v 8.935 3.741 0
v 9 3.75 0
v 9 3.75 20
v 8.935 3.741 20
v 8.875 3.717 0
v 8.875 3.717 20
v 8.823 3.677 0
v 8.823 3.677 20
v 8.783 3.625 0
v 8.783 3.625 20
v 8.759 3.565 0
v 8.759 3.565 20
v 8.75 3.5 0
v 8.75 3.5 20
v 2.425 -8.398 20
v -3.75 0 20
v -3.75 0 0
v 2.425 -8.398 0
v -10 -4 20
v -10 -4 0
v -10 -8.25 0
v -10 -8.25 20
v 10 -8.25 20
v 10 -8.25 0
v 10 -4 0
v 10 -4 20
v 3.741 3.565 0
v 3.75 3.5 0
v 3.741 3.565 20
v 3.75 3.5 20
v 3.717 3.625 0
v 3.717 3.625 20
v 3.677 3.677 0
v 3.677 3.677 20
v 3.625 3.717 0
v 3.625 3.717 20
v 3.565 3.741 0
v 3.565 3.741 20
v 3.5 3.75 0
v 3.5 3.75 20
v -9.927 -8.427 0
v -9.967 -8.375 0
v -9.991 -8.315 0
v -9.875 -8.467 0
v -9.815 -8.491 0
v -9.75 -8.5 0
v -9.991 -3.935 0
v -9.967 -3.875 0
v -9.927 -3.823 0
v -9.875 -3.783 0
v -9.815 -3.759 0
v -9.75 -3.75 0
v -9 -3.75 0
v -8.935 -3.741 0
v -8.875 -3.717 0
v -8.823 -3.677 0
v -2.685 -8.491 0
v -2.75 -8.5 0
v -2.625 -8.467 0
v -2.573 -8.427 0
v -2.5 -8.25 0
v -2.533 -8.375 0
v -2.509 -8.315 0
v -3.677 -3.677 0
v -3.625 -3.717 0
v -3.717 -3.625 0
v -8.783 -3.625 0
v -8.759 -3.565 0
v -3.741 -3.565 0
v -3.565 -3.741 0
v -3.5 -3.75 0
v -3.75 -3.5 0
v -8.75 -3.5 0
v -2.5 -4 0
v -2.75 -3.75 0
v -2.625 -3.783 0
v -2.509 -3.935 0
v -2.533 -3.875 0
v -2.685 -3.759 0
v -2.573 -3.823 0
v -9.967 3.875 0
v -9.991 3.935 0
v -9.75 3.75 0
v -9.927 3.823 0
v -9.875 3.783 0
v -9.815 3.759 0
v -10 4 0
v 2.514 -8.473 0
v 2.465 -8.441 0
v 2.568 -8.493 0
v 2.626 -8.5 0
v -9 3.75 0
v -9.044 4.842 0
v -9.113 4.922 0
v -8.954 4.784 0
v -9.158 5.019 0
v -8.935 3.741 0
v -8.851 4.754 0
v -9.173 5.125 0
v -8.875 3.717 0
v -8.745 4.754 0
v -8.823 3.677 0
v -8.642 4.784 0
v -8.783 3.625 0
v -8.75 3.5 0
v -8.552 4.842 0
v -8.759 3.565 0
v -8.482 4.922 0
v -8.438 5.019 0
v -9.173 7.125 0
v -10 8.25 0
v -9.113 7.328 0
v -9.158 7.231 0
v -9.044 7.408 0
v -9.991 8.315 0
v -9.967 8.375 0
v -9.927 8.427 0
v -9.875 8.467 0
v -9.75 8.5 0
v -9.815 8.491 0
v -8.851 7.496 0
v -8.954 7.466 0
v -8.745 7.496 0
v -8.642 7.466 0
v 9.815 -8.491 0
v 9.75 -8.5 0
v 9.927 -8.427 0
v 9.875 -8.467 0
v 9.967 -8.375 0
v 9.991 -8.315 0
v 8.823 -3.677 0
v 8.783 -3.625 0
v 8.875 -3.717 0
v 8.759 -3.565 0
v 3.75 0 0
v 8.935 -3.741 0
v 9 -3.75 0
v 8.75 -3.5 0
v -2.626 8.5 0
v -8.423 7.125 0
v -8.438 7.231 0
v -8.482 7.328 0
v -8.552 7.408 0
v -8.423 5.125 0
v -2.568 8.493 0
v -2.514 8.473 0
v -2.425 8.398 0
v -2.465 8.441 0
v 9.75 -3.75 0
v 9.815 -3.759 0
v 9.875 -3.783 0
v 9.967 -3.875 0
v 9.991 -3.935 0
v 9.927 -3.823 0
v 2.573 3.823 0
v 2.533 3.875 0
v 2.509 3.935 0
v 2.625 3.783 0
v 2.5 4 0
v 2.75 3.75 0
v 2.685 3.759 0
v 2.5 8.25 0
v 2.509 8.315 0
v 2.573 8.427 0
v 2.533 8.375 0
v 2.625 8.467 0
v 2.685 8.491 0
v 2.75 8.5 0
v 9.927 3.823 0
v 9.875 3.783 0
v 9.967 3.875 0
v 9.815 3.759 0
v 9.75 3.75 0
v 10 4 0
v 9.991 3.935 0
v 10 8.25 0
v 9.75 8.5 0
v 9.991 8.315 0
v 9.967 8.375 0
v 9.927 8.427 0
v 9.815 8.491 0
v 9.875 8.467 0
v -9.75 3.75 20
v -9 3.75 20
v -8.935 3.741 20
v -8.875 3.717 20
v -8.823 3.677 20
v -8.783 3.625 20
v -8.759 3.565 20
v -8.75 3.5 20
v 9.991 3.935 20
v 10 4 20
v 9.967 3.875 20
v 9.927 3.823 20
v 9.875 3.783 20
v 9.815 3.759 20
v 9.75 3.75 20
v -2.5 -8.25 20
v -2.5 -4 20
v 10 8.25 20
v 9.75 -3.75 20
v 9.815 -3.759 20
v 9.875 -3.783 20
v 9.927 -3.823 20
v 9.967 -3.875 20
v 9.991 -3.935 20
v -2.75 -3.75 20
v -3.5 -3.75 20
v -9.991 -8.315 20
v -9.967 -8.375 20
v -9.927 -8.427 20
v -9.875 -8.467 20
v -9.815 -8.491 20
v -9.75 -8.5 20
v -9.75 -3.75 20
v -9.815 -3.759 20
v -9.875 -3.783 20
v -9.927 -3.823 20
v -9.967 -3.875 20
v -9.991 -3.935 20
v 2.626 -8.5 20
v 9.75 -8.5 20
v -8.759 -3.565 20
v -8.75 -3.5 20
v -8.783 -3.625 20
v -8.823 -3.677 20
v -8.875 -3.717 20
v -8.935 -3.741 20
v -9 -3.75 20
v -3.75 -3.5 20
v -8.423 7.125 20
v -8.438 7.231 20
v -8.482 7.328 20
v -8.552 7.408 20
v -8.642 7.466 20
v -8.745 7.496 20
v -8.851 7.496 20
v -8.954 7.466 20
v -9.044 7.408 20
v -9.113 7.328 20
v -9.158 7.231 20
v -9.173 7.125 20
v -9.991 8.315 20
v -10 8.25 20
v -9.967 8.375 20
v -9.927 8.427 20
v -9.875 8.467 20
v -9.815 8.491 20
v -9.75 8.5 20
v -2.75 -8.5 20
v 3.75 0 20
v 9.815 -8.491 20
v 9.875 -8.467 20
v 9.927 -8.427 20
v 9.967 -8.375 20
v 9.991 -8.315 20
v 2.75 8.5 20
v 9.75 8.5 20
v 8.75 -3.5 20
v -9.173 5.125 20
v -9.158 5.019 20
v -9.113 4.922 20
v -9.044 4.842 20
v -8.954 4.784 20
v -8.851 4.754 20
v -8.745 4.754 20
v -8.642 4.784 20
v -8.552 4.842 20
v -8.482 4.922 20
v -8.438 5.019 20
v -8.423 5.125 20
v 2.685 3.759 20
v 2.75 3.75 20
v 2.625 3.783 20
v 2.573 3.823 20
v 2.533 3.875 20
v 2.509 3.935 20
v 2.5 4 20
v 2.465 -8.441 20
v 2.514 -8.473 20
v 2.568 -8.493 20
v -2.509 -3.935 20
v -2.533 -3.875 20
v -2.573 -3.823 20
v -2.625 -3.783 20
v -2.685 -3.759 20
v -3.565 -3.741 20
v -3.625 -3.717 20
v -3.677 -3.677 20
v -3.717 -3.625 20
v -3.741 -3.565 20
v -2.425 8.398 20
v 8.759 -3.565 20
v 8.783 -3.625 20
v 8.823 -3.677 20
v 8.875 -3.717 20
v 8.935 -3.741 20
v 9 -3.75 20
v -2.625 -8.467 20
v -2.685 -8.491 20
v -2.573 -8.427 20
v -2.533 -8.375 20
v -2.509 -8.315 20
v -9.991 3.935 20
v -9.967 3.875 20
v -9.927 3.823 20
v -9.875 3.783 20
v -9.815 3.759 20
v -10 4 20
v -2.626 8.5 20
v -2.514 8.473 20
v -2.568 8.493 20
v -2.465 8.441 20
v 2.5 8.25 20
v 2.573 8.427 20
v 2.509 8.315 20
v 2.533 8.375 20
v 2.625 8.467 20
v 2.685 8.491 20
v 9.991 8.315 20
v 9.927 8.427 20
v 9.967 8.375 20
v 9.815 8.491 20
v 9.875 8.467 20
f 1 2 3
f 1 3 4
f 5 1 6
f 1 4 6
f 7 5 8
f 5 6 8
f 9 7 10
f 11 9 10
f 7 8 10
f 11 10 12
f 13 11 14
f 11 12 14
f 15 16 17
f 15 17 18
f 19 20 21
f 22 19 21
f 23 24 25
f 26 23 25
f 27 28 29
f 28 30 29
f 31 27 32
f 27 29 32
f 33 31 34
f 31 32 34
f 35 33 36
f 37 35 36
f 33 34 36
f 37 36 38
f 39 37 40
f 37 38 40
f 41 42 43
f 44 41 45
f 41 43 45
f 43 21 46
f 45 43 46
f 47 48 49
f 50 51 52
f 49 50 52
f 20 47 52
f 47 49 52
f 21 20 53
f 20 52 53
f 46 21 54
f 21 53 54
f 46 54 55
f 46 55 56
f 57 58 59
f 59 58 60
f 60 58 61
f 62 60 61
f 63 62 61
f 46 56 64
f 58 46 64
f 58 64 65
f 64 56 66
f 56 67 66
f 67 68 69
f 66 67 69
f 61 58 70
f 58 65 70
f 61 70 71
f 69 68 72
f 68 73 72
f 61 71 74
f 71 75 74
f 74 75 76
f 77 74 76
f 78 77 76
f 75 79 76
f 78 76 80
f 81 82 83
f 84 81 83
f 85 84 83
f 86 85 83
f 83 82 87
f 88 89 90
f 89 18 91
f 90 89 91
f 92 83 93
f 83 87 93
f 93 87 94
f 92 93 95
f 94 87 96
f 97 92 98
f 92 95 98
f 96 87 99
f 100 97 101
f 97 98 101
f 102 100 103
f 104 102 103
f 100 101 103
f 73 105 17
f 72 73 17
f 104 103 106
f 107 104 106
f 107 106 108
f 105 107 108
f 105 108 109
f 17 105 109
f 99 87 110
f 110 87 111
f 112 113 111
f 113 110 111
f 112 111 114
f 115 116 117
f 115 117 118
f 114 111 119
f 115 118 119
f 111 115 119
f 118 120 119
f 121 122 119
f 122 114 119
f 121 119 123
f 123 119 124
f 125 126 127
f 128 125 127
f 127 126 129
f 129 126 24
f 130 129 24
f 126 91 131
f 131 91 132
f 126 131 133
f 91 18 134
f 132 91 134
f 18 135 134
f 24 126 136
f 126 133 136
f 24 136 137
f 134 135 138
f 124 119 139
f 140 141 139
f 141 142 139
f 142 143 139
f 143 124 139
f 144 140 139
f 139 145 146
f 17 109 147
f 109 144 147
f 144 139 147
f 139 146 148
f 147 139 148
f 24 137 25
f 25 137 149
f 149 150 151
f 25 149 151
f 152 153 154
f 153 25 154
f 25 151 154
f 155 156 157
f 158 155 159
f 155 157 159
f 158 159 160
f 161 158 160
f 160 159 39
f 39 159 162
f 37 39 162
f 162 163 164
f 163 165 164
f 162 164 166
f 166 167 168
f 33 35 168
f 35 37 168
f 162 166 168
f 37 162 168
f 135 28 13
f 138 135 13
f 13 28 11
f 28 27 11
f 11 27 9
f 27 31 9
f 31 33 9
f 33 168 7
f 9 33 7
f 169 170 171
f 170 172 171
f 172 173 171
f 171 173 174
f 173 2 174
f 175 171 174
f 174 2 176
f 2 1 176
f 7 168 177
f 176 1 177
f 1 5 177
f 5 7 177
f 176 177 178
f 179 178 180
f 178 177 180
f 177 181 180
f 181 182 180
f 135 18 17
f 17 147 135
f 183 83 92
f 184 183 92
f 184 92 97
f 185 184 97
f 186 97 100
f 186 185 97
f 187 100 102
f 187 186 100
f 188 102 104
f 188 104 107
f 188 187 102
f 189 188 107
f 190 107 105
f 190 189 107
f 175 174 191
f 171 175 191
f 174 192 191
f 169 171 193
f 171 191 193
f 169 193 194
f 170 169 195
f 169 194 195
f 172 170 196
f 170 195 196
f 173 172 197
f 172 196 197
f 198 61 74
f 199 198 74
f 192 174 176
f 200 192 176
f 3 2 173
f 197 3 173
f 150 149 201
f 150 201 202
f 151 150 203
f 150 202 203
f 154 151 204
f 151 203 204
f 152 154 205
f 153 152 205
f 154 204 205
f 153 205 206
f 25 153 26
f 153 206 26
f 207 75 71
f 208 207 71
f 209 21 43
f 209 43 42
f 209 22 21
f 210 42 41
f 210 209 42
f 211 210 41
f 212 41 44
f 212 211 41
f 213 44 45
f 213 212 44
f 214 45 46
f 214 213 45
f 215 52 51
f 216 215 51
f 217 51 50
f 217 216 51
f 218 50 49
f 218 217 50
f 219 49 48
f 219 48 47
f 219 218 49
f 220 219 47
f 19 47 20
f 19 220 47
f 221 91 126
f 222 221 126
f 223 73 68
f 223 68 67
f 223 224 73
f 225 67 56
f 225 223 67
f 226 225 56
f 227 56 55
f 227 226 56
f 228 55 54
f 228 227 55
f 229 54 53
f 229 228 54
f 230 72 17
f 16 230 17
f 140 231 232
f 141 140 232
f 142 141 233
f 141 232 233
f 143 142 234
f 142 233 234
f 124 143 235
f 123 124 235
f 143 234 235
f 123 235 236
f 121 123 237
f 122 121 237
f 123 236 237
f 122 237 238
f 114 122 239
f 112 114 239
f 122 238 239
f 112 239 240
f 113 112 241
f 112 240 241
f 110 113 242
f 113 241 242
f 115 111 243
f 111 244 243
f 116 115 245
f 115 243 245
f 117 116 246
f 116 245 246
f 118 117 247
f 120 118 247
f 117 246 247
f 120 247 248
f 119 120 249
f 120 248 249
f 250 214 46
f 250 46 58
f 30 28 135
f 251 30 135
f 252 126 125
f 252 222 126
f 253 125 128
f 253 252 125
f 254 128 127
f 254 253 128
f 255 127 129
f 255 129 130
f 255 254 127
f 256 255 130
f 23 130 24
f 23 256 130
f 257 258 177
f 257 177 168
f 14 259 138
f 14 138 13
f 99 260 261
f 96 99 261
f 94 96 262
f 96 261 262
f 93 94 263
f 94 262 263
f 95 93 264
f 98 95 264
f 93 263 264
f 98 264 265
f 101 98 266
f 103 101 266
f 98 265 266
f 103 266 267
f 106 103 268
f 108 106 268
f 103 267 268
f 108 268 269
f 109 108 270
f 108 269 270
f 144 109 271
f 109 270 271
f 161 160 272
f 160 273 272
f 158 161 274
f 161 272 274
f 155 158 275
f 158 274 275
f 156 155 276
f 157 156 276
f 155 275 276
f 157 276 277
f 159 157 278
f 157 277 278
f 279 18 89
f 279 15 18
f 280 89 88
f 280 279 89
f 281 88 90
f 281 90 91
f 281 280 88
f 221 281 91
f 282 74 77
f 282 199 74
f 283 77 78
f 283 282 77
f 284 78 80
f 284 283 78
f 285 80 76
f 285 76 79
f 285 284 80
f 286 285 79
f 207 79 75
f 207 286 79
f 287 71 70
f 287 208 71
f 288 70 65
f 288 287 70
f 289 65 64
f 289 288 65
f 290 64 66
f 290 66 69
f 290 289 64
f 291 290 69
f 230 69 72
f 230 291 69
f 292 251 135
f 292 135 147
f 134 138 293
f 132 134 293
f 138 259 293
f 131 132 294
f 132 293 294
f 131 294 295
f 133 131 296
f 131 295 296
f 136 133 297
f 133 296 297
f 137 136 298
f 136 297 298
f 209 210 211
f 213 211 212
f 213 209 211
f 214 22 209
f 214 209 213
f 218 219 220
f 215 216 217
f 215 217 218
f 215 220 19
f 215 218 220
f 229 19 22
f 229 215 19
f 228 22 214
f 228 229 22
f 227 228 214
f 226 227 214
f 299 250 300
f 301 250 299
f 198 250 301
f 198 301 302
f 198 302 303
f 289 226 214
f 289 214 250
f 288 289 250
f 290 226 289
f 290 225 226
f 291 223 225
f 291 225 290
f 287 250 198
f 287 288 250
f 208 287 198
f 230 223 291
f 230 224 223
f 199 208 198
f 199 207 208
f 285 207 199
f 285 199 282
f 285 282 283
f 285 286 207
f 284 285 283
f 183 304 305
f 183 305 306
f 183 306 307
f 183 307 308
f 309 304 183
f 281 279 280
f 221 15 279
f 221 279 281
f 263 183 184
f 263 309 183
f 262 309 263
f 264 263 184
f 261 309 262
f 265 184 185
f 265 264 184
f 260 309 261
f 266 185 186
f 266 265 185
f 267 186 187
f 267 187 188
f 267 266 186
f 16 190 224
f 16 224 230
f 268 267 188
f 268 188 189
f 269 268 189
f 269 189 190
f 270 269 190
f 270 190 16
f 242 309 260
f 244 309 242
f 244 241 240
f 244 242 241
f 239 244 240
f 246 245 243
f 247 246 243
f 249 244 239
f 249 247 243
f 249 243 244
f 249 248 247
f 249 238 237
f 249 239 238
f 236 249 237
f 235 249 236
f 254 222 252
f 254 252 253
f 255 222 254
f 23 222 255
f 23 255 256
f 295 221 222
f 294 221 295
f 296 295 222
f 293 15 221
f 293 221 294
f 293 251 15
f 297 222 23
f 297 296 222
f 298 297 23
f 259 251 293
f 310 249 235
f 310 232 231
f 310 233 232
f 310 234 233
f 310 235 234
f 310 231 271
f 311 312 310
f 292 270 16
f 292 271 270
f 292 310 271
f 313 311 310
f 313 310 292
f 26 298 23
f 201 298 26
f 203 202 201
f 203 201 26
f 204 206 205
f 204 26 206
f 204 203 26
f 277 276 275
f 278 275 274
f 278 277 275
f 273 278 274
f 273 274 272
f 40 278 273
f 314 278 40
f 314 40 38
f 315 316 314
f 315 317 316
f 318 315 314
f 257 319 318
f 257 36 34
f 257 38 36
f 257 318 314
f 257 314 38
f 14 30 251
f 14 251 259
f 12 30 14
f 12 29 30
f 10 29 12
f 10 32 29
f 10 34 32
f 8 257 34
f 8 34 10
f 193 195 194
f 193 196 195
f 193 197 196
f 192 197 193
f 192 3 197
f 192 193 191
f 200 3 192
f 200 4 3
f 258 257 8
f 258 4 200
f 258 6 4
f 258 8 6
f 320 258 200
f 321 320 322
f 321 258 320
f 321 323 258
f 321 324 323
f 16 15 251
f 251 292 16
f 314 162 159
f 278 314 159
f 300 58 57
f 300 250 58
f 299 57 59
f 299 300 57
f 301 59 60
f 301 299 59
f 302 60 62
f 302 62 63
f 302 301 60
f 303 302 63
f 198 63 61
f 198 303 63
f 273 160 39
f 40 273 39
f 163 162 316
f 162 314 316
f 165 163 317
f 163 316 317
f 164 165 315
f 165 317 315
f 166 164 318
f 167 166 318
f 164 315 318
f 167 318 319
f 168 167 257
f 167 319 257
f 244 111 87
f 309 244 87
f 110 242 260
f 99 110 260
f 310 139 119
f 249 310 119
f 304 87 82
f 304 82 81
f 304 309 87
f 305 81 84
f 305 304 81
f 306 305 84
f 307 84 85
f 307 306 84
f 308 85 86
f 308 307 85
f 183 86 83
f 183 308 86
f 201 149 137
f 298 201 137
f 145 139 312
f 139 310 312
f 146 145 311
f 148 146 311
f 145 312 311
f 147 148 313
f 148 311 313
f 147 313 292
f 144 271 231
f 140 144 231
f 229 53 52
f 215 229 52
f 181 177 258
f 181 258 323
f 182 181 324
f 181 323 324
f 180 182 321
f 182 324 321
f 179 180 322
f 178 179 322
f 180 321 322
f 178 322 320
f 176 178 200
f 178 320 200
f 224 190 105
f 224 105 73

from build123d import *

# Parameters (mm, degrees)
F1_DEPTH = 20
F3_DEPTH = 25
F4_R     = 0.25


with BuildPart() as f1:
    # F0 (on Top) → F1 (new body)
    with BuildSketch(Plane.XY):
        Polygon((-10, 8.5), (-10, 3.75), (-8.75, 3.75), (-8.75, -3.75), (-10, -3.75), (-10, -8.5), (-2.5, -8.5), (-2.5, -3.75), (-3.75, -3.75), (-3.75, 0), (2.5, -8.5), (10, -8.5), (10, -3.75), (8.75, -3.75), (8.75, 3.75), (10, 3.75), (10, 8.5), (2.5, 8.5), (2.5, 3.75), (3.75, 3.75), (3.75, 0), (-2.5, 8.5), align=None)
    extrude(amount=F1_DEPTH)

    # F2 (on face) → F3 (cut)
    with BuildSketch(Plane.XY.offset(20)):
        with BuildLine():
            ThreePointArc((-8.422959, 7.125), (-8.797959, 7.5), (-9.172959, 7.125))
            Line((-9.172959, 7.125), (-9.172959, 5.125))
            ThreePointArc((-9.172959, 5.125), (-8.797959, 4.75), (-8.422959, 5.125))
            Line((-8.422959, 5.125), (-8.422959, 7.125))
        make_face()
    extrude(amount=-F3_DEPTH, mode=Mode.SUBTRACT)

    # F4
    f4_edges = [f1.edges().sort_by_distance(p)[0] for p in [
        (-10, 8.5, 10),
        (2.5, 8.5, 10),
        (-2.5, 8.5, 10),
        (2.5, 3.75, 10),
        (10, 3.75, 10),
        (10, 8.5, 10),
        (10, -3.75, 10),
        (10, -8.5, 10),
        (2.5, -8.5, 10),
        (-2.5, -3.75, 10),
        (-2.5, -8.5, 10),
        (-10, -8.5, 10),
        (-10, -3.75, 10),
        (-8.75, -3.75, 10),
        (-3.75, -3.75, 10),
        (-8.75, 3.75, 10),
        (-10, 3.75, 10),
        (3.75, 3.75, 10),
        (8.75, 3.75, 10),
        (8.75, -3.75, 10),
    ]]
    fillet(f4_edges, radius=F4_R)


solid = f1.part
